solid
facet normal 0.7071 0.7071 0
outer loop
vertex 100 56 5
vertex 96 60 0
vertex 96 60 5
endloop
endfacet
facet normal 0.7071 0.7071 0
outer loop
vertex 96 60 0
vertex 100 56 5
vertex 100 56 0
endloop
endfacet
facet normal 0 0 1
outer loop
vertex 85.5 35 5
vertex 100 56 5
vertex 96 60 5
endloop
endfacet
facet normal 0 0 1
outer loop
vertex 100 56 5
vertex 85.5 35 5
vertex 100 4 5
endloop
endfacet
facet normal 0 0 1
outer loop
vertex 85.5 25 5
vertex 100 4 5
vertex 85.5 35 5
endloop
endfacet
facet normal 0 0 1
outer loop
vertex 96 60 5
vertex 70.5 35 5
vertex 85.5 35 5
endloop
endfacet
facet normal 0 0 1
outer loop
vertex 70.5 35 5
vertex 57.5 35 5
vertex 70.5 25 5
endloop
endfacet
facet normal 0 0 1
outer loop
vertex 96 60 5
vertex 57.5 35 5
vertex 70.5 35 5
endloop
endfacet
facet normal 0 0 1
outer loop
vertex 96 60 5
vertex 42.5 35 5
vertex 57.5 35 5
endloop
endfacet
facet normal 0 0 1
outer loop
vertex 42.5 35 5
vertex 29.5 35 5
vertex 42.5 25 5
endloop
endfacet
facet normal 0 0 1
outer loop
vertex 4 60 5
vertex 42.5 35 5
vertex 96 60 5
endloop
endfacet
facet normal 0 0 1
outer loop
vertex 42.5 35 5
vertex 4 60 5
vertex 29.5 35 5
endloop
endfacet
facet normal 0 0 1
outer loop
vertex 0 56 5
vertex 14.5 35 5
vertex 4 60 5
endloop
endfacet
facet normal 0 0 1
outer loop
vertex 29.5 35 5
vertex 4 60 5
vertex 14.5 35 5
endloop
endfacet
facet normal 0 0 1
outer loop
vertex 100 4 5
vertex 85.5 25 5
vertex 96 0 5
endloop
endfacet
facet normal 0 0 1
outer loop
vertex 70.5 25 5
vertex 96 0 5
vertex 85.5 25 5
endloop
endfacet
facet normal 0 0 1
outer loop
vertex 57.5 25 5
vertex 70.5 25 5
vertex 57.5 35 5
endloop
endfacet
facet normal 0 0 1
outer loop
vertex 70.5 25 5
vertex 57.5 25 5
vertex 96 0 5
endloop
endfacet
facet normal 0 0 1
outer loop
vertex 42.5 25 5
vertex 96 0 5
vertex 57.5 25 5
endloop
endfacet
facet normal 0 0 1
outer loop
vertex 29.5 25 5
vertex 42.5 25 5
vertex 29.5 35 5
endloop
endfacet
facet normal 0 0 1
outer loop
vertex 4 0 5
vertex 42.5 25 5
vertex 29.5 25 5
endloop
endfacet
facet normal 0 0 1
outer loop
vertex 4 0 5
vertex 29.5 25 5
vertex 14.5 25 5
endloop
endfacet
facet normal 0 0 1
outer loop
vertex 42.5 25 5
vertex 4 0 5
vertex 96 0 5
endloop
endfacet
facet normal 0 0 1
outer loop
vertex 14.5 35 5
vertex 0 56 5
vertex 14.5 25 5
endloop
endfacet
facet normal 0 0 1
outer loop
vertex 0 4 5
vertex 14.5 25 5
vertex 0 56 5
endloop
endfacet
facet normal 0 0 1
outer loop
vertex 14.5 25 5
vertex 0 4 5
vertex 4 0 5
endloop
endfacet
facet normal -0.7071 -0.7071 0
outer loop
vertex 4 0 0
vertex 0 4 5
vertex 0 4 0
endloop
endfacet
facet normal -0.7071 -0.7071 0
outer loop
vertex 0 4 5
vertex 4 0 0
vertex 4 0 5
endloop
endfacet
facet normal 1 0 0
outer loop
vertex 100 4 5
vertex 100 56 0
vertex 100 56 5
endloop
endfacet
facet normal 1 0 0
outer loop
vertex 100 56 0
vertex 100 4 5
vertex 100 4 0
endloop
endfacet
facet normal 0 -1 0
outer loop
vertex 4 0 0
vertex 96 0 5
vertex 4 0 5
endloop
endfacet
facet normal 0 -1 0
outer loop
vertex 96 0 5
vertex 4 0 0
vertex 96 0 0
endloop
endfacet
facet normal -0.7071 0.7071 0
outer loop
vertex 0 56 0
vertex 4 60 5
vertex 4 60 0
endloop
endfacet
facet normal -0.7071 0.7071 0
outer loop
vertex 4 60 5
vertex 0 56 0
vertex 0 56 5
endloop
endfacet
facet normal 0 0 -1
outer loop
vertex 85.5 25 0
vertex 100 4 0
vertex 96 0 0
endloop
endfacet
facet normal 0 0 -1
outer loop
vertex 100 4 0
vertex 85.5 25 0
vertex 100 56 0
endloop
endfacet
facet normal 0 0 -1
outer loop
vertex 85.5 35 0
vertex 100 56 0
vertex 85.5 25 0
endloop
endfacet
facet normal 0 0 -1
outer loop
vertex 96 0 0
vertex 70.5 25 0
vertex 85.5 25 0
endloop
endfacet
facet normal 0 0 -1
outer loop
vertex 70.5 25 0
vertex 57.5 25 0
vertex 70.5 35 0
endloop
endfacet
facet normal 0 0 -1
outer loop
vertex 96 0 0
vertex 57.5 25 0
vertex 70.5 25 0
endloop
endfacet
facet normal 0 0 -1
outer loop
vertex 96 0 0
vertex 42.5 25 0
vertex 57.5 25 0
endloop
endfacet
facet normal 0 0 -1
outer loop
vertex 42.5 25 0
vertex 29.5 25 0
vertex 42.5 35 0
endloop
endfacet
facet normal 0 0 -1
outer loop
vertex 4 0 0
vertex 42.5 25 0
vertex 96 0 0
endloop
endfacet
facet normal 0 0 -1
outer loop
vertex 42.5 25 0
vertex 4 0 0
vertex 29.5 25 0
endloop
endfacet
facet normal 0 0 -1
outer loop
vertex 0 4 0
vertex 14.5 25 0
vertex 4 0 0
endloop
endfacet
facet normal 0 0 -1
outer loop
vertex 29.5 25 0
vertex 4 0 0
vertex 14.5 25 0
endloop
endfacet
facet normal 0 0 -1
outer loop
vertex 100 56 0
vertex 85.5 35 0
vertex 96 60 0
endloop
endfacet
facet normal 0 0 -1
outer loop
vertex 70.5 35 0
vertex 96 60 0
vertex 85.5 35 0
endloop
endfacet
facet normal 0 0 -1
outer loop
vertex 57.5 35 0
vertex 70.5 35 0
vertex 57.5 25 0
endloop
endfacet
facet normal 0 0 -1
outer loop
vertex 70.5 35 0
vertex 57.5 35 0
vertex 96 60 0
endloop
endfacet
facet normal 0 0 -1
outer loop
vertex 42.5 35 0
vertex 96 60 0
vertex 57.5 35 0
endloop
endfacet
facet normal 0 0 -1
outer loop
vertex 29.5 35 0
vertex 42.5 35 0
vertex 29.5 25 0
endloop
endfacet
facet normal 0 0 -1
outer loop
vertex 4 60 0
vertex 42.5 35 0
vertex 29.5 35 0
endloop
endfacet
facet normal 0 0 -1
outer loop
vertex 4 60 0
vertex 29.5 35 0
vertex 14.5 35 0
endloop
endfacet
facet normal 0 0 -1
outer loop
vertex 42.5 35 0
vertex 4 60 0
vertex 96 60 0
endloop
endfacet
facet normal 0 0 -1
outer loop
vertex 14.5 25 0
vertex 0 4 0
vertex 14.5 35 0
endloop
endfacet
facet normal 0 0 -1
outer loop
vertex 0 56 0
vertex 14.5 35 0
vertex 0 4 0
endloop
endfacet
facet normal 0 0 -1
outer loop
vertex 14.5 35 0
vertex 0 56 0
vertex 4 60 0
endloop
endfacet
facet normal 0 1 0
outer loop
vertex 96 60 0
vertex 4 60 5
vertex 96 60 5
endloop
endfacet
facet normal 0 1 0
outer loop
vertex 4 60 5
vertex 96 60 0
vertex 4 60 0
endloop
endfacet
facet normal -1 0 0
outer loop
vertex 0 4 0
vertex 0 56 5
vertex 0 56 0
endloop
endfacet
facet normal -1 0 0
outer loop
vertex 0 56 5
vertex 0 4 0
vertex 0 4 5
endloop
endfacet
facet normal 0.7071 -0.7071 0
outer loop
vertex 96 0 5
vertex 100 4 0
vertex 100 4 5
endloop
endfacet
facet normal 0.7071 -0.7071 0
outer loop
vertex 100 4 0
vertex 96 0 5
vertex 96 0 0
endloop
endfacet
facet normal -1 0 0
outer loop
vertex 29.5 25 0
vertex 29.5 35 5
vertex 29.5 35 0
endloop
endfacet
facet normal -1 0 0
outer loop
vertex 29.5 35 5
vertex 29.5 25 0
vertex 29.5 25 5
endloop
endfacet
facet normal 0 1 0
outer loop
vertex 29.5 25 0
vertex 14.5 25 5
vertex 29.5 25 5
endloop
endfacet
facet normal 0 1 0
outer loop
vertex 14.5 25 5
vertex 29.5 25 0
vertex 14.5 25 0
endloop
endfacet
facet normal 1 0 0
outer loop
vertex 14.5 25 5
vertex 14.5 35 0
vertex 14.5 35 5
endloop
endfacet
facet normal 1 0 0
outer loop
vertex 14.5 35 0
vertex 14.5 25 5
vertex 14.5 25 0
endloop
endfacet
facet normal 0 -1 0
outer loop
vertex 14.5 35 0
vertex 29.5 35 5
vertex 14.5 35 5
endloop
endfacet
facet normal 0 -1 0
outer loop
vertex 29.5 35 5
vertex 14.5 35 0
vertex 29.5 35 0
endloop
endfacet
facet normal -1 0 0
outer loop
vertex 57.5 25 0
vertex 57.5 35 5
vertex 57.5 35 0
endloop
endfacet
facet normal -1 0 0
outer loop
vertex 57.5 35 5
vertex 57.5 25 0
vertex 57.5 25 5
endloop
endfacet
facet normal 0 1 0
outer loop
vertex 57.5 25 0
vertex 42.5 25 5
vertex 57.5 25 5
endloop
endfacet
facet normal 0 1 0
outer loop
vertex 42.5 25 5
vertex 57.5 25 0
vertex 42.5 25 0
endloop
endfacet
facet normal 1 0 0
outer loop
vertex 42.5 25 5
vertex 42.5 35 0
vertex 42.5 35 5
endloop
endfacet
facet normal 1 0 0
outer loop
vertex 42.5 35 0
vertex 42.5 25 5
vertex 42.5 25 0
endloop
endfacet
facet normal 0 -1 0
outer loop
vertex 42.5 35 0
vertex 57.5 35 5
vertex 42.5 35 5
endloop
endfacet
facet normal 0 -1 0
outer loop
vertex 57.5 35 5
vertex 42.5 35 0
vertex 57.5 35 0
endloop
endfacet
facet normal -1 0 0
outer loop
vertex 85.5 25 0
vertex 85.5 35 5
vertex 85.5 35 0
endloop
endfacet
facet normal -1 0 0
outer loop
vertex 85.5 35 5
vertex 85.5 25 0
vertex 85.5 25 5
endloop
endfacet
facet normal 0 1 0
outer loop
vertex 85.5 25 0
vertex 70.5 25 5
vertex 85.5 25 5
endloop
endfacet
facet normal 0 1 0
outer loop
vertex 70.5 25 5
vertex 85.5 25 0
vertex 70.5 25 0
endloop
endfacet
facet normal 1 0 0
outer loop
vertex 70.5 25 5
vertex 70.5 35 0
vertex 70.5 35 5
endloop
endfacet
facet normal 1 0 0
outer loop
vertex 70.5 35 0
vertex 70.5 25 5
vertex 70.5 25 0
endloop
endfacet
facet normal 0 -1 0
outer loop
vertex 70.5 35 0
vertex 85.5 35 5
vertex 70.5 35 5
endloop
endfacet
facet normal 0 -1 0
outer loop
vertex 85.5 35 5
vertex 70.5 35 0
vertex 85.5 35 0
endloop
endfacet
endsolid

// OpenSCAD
$fn = 32;

// ----------------------------------------------------------------------
// Windowed plate: 3 voids, 100 x 60 x 5 mm
// ----------------------------------------------------------------------

// --- parameters (mm) ---
plate_l = 100;            // plate length, X
plate_w = 60;             // plate width, Y
plate_t = 5;              // plate thickness, Z
edge_margin = 8;          // wall from the plate edge to any window
windows = 3;              // number of windows in the row
win_l = 15;               // window length
win_w = 10;               // window width
win_pitch = 28;           // window pitch along X
depth_1 = 5;              // depth of void 1 (full thickness = through)
depth_2 = 5;              // depth of void 2 (full thickness = through)
depth_3 = 5;              // depth of void 3 (full thickness = through)
corner_c = 4;             // corner chamfer of the plate

profile = [[4, 0], [96, 0], [100, 4], [100, 56], [96, 60], [4, 60], [0, 56], [0, 4]];  // primary outline, 8 points, counter clockwise
void_1 = [[14.5, 25], [29.5, 25], [29.5, 35], [14.5, 35]];  // window 1 of the row, 4 points
void_2 = [[42.5, 25], [57.5, 25], [57.5, 35], [42.5, 35]];  // window 2 of the row, 4 points
void_3 = [[70.5, 25], [85.5, 25], [85.5, 35], [70.5, 35]];  // window 3 of the row, 4 points

// --- the one profile operation ---
difference() {
  linear_extrude(height = plate_t) polygon(points = profile);
  translate([0, 0, -1])
    linear_extrude(height = plate_t + 2) polygon(points = void_1);
  translate([0, 0, -1])
    linear_extrude(height = plate_t + 2) polygon(points = void_2);
  translate([0, 0, -1])
    linear_extrude(height = plate_t + 2) polygon(points = void_3);
}
